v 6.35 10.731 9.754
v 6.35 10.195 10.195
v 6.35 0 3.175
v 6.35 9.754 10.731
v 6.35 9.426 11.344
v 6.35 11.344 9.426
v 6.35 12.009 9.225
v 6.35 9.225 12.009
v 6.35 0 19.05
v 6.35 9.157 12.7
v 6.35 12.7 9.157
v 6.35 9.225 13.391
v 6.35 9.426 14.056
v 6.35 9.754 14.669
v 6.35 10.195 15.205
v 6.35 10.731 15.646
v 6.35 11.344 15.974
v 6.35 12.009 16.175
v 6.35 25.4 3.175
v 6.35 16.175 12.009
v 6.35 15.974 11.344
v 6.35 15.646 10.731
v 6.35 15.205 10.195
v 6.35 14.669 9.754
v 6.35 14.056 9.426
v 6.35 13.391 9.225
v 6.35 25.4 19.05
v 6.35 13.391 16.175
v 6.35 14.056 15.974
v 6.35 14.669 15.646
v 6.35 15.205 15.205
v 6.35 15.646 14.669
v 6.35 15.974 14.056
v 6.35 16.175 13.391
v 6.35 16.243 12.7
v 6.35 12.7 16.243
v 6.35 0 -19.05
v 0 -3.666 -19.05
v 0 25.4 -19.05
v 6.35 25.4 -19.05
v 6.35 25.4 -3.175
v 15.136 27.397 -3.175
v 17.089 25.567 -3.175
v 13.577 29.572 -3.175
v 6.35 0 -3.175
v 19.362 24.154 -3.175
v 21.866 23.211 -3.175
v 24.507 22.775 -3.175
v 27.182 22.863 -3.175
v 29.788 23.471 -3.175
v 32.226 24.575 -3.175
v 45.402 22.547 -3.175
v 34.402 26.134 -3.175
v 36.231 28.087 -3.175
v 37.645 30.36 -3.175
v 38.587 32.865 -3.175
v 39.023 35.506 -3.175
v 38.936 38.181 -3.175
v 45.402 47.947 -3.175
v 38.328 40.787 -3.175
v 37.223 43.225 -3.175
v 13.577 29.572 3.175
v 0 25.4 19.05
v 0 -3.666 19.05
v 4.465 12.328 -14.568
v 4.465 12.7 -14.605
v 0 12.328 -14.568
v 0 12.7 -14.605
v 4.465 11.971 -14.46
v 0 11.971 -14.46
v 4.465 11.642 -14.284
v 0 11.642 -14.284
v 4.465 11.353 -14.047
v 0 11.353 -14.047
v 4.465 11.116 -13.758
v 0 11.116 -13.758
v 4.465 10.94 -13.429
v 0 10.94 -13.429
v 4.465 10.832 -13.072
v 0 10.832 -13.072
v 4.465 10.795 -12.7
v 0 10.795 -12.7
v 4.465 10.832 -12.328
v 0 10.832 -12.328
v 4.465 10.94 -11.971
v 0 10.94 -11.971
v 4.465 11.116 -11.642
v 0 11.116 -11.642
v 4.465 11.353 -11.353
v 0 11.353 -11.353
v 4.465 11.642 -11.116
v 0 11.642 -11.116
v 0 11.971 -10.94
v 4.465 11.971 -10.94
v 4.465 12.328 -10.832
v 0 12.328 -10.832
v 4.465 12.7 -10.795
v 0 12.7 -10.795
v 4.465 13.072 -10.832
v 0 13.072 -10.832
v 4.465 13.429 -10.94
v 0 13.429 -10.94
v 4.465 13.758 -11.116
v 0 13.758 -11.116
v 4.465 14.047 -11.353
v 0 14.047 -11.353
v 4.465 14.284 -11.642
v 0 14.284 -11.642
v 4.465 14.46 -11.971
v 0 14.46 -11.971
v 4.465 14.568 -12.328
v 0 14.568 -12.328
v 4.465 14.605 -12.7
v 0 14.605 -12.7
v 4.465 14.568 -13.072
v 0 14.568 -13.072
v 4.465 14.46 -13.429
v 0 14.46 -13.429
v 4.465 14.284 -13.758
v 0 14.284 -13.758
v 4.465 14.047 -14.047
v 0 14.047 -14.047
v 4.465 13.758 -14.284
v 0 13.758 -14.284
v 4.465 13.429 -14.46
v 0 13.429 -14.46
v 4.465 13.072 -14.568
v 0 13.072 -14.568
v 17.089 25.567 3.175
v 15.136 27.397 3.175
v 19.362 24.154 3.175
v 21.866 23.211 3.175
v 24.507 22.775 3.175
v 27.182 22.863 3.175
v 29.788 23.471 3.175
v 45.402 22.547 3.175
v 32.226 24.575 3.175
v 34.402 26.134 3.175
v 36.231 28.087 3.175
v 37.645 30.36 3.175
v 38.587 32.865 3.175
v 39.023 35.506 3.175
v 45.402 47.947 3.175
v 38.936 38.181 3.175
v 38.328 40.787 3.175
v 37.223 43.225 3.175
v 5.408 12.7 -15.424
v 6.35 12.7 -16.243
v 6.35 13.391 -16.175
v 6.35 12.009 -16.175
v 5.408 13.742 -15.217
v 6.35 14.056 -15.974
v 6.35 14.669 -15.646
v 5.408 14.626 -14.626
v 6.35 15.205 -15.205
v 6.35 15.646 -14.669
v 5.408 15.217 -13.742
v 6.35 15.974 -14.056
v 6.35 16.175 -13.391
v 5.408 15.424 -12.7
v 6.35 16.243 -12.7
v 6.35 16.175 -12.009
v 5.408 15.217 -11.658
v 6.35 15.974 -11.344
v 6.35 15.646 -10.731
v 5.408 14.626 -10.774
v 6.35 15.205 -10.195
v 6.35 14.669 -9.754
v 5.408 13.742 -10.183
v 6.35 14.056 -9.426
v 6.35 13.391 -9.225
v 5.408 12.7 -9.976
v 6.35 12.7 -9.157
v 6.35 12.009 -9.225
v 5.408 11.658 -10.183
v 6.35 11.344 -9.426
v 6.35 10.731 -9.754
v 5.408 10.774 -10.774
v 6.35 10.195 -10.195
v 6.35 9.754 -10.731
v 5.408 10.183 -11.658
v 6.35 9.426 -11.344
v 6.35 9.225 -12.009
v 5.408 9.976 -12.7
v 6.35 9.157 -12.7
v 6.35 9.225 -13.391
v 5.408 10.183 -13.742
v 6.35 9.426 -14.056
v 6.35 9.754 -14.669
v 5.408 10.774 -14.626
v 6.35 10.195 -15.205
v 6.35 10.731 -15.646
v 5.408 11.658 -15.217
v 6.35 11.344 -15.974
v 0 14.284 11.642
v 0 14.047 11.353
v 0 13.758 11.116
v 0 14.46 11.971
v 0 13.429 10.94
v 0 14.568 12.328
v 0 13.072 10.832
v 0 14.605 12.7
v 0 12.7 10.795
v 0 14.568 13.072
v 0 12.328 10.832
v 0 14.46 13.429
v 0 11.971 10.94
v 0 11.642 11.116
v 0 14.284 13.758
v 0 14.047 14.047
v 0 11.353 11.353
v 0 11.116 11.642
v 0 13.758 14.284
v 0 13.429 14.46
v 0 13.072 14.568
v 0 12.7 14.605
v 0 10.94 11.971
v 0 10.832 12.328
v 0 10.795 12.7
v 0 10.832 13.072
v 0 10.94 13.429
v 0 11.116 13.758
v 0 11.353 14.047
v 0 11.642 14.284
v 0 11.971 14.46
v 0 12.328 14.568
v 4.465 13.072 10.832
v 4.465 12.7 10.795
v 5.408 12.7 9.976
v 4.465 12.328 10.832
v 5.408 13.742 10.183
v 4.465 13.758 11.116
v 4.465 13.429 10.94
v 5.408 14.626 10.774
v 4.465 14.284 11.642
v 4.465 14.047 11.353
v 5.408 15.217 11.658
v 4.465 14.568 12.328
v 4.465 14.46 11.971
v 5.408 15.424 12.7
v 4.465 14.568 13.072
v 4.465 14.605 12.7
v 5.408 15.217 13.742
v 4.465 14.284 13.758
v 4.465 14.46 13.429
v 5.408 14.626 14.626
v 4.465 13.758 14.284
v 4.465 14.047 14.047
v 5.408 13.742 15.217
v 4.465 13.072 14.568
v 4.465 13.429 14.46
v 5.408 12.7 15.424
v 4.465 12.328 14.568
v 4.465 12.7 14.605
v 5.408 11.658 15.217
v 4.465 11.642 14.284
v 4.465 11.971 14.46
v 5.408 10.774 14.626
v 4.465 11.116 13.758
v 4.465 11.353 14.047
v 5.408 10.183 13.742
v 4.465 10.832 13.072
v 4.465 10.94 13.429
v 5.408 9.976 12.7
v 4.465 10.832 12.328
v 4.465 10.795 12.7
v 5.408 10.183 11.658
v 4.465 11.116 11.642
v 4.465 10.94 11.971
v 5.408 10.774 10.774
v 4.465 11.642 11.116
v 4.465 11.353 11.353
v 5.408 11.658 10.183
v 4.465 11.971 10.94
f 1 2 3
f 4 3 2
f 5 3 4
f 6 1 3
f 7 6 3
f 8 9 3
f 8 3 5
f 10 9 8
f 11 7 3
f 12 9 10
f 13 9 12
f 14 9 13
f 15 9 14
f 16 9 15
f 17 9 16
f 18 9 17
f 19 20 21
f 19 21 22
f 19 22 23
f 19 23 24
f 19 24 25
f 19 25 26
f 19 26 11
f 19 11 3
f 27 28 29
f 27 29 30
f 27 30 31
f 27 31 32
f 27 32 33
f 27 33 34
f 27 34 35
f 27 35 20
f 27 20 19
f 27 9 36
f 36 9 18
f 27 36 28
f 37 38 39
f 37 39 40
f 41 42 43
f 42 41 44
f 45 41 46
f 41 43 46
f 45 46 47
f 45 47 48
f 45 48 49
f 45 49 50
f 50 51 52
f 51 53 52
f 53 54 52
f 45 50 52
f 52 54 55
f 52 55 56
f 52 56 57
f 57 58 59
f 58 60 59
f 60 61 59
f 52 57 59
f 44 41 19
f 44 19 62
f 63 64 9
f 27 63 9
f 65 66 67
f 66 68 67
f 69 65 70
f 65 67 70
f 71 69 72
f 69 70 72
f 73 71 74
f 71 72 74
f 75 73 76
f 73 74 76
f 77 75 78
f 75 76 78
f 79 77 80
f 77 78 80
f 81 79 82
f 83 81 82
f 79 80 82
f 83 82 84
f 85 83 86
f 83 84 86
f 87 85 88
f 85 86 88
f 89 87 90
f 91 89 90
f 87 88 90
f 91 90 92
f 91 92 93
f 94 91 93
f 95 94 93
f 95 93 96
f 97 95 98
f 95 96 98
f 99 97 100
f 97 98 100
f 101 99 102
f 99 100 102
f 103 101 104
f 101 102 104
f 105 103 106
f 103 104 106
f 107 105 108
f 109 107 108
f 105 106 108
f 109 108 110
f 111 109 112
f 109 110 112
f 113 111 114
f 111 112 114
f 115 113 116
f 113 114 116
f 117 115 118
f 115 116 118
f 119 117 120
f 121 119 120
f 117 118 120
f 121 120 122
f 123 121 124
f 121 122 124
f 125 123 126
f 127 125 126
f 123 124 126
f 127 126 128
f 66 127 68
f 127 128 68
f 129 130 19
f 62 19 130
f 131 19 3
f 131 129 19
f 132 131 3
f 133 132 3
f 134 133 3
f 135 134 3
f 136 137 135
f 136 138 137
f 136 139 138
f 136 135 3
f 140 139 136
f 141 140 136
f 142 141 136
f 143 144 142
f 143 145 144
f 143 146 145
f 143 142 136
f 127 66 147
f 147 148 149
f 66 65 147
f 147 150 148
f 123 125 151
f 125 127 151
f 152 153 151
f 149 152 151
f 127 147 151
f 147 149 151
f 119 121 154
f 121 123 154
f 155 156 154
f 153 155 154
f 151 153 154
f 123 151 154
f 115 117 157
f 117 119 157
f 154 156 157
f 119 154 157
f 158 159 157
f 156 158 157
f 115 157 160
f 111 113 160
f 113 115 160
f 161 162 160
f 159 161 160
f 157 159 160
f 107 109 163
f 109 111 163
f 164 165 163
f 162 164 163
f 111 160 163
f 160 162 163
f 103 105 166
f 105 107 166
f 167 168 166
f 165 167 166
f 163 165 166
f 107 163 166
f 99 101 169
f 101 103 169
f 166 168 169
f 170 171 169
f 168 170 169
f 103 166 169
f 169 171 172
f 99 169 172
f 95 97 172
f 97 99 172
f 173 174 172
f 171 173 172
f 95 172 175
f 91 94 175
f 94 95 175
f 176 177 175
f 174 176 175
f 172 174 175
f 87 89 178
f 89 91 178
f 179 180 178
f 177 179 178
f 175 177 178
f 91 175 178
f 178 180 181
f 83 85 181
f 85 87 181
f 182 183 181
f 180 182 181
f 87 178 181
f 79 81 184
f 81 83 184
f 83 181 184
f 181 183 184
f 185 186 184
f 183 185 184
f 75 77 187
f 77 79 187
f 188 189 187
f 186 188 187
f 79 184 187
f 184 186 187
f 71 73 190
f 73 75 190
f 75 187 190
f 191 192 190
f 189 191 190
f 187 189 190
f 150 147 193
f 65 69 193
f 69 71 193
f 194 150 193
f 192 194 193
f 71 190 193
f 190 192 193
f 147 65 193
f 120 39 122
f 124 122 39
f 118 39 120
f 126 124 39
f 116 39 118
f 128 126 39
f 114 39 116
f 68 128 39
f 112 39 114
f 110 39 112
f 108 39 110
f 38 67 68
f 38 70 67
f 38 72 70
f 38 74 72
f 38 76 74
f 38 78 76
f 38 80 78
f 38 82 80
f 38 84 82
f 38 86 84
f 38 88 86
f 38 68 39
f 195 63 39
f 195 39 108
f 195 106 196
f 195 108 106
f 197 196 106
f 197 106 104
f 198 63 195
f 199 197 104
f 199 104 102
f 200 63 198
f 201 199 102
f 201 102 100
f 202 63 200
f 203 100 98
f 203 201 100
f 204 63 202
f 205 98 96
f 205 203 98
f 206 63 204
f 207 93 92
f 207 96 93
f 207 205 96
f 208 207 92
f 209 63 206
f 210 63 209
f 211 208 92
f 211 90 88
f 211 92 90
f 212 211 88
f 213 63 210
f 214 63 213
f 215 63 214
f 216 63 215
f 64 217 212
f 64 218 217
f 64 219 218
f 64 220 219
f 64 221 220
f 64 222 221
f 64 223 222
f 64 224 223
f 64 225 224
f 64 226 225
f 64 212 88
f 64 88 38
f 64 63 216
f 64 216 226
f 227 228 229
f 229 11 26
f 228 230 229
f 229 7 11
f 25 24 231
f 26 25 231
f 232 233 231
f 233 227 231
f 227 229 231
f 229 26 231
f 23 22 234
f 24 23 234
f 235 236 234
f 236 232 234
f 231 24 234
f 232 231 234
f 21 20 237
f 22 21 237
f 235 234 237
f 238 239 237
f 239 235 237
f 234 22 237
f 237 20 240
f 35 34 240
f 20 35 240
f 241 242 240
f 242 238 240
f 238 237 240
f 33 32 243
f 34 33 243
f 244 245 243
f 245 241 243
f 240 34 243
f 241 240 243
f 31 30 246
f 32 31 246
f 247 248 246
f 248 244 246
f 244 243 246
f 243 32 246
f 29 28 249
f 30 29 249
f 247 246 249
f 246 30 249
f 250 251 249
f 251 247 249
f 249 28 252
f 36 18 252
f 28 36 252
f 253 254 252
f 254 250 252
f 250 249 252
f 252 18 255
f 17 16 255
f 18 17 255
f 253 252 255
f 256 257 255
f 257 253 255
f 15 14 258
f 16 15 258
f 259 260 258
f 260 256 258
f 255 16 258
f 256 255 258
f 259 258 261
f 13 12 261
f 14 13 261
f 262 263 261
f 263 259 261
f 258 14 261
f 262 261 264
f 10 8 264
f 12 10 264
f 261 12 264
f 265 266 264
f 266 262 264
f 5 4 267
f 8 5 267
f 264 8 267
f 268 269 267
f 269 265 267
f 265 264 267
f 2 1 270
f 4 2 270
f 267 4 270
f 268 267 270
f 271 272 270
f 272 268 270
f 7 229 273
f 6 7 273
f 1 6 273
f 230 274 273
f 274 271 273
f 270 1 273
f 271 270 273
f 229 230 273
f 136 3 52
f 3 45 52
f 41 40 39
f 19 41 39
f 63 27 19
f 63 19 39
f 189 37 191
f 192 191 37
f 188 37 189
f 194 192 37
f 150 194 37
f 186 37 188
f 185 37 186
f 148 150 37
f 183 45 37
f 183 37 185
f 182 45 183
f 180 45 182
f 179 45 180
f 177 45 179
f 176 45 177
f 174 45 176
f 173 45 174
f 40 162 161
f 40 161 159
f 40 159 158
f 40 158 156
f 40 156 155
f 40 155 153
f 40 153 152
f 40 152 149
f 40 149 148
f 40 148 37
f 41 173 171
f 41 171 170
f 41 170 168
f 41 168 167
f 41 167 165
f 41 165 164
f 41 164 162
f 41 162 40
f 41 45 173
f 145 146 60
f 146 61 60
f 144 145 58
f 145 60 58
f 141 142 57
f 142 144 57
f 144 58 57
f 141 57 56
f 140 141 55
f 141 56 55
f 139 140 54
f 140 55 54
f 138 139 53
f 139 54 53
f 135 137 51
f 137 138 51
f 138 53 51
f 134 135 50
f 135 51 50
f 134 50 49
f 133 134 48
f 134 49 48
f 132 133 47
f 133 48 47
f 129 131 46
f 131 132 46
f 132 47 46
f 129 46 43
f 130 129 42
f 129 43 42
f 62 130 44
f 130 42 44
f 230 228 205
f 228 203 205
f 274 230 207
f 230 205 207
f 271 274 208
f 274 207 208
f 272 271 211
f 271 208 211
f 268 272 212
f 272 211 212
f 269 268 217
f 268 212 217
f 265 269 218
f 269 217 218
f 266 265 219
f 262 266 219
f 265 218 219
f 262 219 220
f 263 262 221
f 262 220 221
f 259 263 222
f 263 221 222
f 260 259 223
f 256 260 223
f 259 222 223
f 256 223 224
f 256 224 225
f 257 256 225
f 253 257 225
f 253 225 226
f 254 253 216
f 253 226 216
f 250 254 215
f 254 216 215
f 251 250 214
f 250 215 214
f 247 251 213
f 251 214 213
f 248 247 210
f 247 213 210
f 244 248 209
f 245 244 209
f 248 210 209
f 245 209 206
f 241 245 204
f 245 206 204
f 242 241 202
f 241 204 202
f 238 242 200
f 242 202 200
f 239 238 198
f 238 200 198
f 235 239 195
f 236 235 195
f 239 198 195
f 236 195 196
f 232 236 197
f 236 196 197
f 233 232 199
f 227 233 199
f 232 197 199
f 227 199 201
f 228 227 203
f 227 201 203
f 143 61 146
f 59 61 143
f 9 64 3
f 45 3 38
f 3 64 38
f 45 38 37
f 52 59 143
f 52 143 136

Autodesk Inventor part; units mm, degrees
ref_plane "YZ Plane" through (0, 0, 0) normal (1, 0, 0) x (0, 1, 0)
ref_plane "XZ Plane" through (0, 0, 0) normal (0, 1, 0) x (-1, 0, 0)
ref_plane "XY Plane" through (0, 0, 0) normal (0, 0, 1) x (1, 0, 0)
sketch "Sketch5" plane through (0, 0, 0) normal (0, 0, 1) x (1, 0, 0)
  line L0 (0, 0) -> (6.35, 0)
  line L1 (6.35, 0) -> (6.35, 25.4)
  line L2 (6.35, 25.4) -> (0, 25.4)
  line L3 (0, 25.4) -> (0, 0)
  dimension "d21" = 25.4
  dimension "d22" = 6.35
extrude "Extrusion3" add sketch "Sketch5" against normal mid plane 38.1
sketch "Sketch6" plane through (0, 0, 0) normal (0, 0, 1) x (1, 0, 0)
  line L0 (6.35, 25.4) -> (6.35, 0) projected
  line L1 (0, 25.4) -> (6.35, 25.4) projected
  line L2 (6.35, 0) -> (0, 0) projected
  line L3 (0, 0) -> (0, 25.4) projected
  line L4 (6.35, 0) -> (45.4025, 22.547)
  line L5 (6.35, 0) -> (51.4439, 0) construction
  line L6 (45.4025, 47.947) -> (45.4025, 22.547)
  arc A0 (13.5766, 29.5723) -> (37.2234, 43.2248) centre (25.4, 36.3985) ccw
  line L7 (6.35, 25.4) -> (13.5766, 29.5723)
  line L8 (37.2234, 43.2248) -> (45.4025, 47.947)
  dimension "d25" = 30
  dimension "d26" = 27.305
  dimension "d29" = 6.35
  dimension "d30" = 25.4
  dimension "d33" = 0
extrude "Extrusion4" add sketch "Sketch6" along normal mid plane 6.35 contours L7 A0 L8 L6 L4 L0
sketch "Sketch7" plane through (6.35, 0, 19.05) normal (1, 0, 0) x (0, 0, -1)
  line L0 (38.1, 25.4) -> (0, 25.4) construction
  line L1 (6.35, 25.4) -> (6.35, 0) construction
  line L2 (31.75, 25.4) -> (31.75, 0) construction
  line L3 (0, 0) -> (0, 25.4) construction
  line L4 (38.1, 25.4) -> (38.1, 0) construction
  line L5 (0, 0) -> (15.875, 0) projected
  line L6 (22.225, 0) -> (38.1, 0) projected
  point P0 (19.05, 0)
  point P1 (6.35, 12.7)
  point P2 (31.75, 12.7)
  dimension "d34" = 6.35
  dimension "d35" = 6.35
sketch "Sketch8" plane through (0, 0, 0) normal (0, 0, 1) x (1, 0, 0)
  line L0 (0, 0) -> (0, 25.4) projected
  line L1 (6.35, 0) -> (0, 0) projected
  line L2 (45.4025, 22.547) -> (6.35, 0) projected
  line L3 (0, 0) -> (6.35, 0)
  line L4 (0, -3.6662) -> (6.35, 0)
  line L5 (0, 0) -> (0, -3.6662)
extrude "Extrusion5" add sketch "Sketch8" along normal mid plane 38.1
hole "Hole3" at (6.35, 12.7, 12.7) at (6.35, 12.7, -12.7) direction (-1, 0, 0) diameter 3.81 end through all countersink diameter 7.0866 countersink angle 82 clearance for "Flat Head Machine Screw (82)" size "#6" standard "Ansi Unified Screw Threads"
equation "\"d21\" = supportHeight"
equation "\"d22\" = supportWidth"
equation "\"d23\" = totalScrewHoldWidth"
equation "\"d25\" = supportAngle"
equation "\"d26\" = pipeDiameter"
equation "\"d30\" = distanceFromWallToPipeCenter"
equation "\"d31\" = supportWidth"
equation "\"d47\" = totalScrewHoldWidth"
equation "\"pipeDiameter\" = 27.305"
equation "\"distanceFromWallToPipeCenter\" = 25.4"
equation "\"supportHeight\" = 25.4"
equation "\"supportWidth\" = 6.35"
equation "\"screwHoldDepth\" = 6.35"
equation "\"totalScrewHoldWidth\" = 38.1"
equation "\"screwPositionFromTop\" = 6.35"
equation "\"supportAngle\" = 30deg"
properties part number "PipeSupport-1_00-030"
